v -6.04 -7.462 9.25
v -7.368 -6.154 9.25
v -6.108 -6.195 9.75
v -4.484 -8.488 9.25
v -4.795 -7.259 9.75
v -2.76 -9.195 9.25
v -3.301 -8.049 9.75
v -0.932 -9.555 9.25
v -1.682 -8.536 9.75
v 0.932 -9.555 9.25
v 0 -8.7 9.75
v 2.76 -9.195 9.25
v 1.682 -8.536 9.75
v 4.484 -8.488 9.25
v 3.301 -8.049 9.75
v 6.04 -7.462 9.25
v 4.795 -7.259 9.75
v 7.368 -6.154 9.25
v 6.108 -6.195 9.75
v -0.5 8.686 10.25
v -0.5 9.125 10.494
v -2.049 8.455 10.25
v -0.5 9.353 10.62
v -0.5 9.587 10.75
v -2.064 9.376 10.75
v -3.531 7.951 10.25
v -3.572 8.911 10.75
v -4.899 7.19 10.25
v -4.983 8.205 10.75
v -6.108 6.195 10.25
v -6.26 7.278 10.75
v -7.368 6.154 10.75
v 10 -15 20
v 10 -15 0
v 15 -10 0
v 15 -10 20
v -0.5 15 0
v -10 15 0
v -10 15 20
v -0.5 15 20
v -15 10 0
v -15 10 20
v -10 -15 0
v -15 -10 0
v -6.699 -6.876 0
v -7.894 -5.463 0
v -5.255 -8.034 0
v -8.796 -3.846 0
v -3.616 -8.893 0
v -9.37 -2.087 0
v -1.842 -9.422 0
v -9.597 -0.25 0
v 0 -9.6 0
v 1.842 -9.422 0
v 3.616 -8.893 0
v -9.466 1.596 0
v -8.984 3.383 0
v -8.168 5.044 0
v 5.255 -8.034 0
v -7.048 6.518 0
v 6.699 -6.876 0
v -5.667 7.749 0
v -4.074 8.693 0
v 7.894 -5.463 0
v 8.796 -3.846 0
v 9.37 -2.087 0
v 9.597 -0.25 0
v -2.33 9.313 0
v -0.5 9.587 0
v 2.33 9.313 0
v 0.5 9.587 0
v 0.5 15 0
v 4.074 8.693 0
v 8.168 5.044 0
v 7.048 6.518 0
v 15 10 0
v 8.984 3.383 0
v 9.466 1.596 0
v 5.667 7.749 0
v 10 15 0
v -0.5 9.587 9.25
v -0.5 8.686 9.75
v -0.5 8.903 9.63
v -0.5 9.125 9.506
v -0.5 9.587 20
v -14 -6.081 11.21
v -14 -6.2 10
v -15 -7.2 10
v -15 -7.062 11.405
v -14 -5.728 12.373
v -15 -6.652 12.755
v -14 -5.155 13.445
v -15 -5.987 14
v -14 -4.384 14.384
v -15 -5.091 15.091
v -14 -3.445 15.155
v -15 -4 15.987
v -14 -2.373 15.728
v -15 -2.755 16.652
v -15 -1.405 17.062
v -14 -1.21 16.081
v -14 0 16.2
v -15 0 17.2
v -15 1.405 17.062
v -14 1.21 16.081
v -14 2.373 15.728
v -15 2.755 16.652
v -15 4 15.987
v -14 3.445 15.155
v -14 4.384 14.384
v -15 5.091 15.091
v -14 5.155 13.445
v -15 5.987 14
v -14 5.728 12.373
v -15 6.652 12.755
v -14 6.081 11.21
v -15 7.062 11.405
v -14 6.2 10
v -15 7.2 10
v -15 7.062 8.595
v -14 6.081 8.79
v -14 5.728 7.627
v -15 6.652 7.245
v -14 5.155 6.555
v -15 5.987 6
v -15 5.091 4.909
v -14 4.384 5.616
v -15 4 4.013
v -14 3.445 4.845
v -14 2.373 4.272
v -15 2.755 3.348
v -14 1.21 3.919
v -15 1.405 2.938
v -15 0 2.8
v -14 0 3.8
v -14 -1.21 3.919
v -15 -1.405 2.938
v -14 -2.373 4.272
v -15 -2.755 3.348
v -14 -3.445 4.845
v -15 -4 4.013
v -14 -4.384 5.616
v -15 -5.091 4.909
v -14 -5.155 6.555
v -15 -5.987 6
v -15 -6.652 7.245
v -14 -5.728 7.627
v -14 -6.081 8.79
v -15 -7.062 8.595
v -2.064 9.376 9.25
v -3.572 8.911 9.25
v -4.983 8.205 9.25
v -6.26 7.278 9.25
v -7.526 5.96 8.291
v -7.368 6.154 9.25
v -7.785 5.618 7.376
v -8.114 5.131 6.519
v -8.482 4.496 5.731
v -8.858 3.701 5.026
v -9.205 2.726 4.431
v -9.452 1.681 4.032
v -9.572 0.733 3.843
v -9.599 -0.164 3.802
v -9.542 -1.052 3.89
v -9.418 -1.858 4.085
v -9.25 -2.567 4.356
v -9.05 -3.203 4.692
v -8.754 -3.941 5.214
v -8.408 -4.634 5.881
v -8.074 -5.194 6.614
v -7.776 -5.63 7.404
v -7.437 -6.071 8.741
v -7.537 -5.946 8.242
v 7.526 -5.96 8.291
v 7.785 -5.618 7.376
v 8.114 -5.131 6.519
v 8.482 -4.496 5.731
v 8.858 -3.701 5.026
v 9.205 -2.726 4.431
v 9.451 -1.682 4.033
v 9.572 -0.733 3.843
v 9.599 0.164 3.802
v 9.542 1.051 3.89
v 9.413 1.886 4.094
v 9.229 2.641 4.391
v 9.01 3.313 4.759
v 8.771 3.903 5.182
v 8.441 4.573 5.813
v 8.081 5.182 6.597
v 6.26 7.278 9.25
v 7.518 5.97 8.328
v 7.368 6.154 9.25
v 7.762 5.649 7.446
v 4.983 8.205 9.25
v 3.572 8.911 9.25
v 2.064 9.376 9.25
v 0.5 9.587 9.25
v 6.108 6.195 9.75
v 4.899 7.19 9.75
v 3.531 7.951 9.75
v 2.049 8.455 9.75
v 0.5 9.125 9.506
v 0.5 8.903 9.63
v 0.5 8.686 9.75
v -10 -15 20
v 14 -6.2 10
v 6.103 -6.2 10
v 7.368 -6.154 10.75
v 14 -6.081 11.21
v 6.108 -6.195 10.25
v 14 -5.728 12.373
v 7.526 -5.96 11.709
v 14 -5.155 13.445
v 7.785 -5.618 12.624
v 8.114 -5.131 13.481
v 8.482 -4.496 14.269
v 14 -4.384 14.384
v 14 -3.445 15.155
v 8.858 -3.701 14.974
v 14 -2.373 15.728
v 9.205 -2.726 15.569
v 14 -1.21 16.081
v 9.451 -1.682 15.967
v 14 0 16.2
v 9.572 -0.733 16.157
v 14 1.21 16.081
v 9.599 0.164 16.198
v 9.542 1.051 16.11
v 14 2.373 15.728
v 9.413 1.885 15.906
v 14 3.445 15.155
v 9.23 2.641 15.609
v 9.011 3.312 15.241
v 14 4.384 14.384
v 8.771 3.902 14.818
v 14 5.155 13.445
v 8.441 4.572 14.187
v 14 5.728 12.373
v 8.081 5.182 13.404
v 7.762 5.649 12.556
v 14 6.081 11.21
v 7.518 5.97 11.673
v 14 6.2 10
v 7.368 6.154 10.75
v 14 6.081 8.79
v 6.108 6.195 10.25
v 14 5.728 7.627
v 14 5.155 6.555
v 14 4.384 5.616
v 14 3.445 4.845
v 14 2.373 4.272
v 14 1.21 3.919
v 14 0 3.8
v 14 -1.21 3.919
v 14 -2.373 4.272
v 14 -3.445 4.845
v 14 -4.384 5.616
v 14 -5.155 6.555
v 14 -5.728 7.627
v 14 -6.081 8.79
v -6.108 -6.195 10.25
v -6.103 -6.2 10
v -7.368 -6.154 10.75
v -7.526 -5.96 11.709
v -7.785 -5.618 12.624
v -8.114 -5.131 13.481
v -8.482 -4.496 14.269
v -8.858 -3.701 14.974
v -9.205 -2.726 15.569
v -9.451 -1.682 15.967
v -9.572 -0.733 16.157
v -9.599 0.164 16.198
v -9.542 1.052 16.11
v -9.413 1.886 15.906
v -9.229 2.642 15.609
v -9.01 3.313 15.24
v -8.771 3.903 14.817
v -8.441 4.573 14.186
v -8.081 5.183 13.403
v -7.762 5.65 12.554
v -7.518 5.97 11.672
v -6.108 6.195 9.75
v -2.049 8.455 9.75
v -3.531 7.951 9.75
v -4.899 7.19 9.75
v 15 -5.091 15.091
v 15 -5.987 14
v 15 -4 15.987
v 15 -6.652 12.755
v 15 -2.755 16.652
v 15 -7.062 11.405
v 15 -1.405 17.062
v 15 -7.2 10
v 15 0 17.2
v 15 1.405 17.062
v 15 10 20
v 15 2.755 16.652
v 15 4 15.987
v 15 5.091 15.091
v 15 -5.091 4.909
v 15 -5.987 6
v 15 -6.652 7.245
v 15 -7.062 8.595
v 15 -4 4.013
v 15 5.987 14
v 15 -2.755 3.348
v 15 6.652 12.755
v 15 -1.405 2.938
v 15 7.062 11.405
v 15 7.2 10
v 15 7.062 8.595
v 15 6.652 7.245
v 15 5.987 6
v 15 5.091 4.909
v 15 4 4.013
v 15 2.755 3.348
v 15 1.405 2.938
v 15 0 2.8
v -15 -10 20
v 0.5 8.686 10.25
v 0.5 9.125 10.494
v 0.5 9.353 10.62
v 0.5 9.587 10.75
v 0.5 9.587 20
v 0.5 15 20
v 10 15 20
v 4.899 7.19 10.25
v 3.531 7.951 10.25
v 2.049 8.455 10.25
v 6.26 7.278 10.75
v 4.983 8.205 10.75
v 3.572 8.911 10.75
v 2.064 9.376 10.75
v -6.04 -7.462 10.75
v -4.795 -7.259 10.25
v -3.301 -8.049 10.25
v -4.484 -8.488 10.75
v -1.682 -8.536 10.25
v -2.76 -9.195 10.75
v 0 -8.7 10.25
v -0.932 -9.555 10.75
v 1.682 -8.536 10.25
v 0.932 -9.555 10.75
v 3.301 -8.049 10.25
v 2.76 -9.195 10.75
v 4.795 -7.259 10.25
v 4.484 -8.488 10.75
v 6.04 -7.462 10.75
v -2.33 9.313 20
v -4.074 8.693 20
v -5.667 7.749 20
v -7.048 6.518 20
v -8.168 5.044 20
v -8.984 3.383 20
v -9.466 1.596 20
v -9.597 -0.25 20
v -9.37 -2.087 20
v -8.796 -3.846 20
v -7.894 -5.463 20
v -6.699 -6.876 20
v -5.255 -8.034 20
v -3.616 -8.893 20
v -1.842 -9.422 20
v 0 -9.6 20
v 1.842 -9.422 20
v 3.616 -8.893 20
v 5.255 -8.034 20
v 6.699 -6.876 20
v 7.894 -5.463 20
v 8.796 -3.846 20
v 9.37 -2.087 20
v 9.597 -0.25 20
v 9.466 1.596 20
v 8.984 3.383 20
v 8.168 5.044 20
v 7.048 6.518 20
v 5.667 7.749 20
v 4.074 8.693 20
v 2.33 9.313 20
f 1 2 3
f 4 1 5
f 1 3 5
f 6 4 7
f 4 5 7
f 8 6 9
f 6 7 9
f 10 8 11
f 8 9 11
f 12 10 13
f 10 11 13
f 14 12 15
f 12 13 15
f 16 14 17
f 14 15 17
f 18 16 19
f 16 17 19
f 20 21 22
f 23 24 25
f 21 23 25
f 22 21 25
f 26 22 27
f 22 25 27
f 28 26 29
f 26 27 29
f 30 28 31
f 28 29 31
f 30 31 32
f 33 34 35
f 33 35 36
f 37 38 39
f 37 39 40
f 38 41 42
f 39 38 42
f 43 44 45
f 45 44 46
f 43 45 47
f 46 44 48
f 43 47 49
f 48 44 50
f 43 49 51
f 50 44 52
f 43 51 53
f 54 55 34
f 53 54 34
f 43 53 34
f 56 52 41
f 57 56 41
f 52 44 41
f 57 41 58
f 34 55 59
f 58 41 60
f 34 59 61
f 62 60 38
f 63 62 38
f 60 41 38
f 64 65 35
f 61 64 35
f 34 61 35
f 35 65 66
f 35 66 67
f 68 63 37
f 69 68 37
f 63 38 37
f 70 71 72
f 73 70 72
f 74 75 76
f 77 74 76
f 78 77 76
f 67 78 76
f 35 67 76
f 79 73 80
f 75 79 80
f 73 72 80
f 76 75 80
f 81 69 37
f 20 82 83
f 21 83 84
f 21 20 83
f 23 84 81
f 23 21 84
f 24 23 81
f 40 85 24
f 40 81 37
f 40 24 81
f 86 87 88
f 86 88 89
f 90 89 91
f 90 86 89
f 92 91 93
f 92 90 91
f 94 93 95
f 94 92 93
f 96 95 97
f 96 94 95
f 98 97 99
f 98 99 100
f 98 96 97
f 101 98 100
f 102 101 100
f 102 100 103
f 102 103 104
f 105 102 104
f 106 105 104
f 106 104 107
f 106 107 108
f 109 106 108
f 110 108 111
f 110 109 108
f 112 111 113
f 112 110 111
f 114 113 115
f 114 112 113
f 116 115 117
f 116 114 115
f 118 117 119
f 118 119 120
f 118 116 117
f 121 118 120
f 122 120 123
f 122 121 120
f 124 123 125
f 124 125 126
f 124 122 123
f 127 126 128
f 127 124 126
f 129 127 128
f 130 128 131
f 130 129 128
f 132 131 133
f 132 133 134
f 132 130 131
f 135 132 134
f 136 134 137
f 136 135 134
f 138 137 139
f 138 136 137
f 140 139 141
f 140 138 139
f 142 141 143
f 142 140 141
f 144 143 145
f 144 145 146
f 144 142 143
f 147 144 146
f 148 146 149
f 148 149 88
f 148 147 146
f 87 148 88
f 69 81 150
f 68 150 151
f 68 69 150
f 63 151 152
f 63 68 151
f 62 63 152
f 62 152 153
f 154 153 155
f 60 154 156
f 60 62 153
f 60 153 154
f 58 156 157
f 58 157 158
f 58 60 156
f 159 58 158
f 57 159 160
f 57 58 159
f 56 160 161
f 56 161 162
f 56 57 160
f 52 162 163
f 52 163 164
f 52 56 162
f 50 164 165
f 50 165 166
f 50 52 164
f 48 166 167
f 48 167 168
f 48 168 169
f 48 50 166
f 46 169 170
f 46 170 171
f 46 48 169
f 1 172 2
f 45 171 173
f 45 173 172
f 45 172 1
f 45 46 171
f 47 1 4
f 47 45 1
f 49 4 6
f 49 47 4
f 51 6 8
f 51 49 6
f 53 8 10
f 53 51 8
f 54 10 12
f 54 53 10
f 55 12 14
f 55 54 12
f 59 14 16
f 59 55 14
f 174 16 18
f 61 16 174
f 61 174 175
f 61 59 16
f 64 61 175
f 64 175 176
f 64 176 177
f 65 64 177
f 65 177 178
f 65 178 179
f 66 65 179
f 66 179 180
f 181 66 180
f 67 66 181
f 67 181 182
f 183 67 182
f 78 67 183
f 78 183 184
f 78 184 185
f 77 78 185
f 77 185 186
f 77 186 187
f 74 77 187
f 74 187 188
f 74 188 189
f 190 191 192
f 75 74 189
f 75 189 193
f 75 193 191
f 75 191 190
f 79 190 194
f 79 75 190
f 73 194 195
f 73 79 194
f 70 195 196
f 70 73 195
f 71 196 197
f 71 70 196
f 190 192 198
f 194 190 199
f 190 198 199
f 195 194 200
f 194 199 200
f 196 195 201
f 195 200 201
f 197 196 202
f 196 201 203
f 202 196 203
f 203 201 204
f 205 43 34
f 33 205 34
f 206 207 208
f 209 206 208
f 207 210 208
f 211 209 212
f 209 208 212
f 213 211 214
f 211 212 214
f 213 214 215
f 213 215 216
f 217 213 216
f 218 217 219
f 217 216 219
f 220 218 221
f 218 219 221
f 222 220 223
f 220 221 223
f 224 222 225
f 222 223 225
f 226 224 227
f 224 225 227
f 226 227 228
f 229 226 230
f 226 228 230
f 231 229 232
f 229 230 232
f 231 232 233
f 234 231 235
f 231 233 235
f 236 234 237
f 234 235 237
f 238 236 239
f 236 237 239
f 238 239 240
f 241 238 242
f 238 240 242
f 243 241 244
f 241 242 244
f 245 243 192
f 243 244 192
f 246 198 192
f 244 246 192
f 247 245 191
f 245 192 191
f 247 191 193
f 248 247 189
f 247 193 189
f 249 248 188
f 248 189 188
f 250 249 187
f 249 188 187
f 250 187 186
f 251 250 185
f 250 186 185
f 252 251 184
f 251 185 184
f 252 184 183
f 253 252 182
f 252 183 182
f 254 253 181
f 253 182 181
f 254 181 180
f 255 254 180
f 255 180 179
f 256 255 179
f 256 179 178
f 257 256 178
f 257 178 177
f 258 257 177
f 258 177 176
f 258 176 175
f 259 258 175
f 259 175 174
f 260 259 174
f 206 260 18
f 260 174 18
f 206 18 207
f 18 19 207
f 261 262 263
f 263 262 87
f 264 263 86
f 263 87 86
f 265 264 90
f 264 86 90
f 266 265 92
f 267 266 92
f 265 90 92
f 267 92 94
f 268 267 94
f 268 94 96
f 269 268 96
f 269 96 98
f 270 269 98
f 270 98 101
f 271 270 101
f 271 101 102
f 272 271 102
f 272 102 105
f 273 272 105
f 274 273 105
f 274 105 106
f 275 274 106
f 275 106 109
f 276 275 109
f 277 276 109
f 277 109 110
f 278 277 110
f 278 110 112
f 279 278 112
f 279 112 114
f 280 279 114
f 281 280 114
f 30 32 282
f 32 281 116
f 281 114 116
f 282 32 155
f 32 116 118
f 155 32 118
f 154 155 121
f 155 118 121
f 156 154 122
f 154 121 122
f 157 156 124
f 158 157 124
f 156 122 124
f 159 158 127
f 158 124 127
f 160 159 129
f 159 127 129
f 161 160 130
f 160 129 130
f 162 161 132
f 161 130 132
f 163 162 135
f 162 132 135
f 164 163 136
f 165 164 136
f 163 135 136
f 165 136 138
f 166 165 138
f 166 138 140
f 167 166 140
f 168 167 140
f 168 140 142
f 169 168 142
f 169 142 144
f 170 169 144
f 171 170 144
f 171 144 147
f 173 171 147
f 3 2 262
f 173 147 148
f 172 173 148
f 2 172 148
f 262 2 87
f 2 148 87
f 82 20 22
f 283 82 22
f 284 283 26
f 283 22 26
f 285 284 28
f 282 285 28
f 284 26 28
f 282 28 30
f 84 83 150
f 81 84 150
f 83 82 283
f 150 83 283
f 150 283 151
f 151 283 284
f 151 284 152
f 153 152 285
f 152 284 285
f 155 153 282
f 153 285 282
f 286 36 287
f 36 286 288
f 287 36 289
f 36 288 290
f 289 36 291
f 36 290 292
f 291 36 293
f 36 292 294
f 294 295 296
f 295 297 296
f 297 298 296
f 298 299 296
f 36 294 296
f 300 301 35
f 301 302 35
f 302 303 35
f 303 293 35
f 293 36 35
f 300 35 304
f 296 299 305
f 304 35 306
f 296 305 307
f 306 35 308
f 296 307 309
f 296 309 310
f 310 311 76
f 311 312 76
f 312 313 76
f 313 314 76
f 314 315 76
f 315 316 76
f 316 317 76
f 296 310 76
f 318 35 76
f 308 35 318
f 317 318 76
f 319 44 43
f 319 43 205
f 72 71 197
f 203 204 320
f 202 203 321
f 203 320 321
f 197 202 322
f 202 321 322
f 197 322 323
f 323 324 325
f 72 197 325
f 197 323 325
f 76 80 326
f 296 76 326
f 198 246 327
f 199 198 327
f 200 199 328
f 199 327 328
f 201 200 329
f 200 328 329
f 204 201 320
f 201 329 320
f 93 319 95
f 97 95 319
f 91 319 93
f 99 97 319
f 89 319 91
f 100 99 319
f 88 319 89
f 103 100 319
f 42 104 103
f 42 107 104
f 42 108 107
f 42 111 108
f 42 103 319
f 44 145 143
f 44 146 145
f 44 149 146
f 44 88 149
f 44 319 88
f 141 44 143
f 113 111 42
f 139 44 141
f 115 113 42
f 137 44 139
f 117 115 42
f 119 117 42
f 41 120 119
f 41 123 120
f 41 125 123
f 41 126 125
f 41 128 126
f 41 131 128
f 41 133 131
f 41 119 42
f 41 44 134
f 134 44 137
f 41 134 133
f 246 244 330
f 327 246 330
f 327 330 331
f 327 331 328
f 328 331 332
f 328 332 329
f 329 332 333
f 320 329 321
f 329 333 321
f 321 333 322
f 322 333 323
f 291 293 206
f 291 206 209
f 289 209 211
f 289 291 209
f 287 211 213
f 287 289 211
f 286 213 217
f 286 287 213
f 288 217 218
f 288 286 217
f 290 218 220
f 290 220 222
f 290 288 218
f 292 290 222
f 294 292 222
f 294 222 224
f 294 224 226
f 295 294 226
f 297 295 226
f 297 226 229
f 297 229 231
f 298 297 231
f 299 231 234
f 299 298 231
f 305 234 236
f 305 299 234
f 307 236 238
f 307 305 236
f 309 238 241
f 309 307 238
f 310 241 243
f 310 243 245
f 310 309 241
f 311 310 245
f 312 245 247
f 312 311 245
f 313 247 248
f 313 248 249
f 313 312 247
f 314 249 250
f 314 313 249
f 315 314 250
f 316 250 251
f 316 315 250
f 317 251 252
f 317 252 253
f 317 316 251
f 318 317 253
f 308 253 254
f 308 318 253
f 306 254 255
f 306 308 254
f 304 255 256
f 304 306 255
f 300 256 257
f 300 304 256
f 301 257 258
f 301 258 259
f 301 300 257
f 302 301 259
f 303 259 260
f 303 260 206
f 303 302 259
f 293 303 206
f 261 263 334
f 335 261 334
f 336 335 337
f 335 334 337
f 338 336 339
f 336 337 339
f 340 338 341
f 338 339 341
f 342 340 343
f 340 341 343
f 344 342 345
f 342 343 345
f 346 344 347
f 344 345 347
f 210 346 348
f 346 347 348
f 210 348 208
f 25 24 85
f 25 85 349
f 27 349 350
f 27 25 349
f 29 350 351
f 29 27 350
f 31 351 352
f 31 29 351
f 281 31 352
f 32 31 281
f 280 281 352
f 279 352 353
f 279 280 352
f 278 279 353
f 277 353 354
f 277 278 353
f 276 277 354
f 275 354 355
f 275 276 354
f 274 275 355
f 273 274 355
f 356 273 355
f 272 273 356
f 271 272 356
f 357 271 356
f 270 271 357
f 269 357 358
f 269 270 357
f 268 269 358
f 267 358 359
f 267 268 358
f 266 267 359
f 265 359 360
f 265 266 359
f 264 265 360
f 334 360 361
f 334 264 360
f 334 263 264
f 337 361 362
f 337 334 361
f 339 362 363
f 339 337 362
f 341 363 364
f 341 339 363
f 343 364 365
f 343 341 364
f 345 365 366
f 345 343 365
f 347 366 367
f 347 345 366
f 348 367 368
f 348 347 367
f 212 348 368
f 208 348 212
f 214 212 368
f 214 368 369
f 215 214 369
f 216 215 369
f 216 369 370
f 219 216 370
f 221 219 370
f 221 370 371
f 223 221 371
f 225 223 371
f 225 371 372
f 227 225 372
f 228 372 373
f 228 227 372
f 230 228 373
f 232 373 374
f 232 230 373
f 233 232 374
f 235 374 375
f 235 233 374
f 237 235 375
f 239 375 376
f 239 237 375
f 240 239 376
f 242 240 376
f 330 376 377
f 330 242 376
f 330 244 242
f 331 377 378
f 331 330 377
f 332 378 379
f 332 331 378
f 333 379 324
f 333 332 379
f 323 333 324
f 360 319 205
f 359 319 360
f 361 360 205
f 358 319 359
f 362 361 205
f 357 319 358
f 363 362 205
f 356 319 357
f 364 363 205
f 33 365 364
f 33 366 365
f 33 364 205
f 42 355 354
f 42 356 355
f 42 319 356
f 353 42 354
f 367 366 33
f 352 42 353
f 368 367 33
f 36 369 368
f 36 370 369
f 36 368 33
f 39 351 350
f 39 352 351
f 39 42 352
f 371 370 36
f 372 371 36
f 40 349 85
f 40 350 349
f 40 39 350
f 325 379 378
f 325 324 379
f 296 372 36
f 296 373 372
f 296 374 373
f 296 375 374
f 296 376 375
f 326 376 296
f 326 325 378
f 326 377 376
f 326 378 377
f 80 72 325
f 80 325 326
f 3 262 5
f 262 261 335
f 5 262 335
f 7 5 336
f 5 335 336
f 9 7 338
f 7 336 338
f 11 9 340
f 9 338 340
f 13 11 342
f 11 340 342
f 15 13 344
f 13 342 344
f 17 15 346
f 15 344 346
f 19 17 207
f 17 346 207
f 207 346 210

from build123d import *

# Parameters (mm, degrees)
SKETCH047_W     = 30
SKETCH047_H     = 30
SKETCH047_R     = 9.6
PAD018_DEPTH    = 20
SKETCH049_W     = 1
SKETCH049_H     = 15
POCKET028_DEPTH = 20
SKETCH050_R     = 6.2
POCKET029_DEPTH = 40
CHAMFER004_SIZE = 1
CHAMFER005_SIZE = 5


with BuildPart() as part:
    # Sketch047 → Pad018 (new body)
    with BuildSketch(Plane.XY):
        Rectangle(SKETCH047_W, SKETCH047_H)
        Circle(SKETCH047_R, mode=Mode.SUBTRACT)
    extrude(amount=PAD018_DEPTH)

    # Sketch048 → Revolution002 (revolve)
    with BuildSketch(Plane.YZ):
        Polygon((9.6, 10.75), (9.6, 9.25), (8.7, 9.75), (8.7, 10.25), align=None)
    revolve(axis=Axis((0, 0, 0), (0, 0, 1)))

    # Sketch049 (on Face11 of Revolution002) → Pocket028 (cut)
    with BuildSketch(Plane.XY.offset(20)):
        with Locations((0, 7.5)):
            Rectangle(SKETCH049_W, SKETCH049_H)
    extrude(amount=-POCKET028_DEPTH, mode=Mode.SUBTRACT)

    # Sketch050 (on Face12 of Pocket028) → Pocket029 (cut)
    with BuildSketch(Plane(origin=(-15, 0, 0), x_dir=(0, -1, 0), z_dir=(-1, 0, 0))):
        with Locations((0, 10)):
            Circle(SKETCH050_R)
    extrude(amount=-POCKET029_DEPTH, mode=Mode.SUBTRACT)

    # Chamfer004
    chamfer004_edges = [part.edges().sort_by_distance(p)[0] for p in [
        (-15, 6.2, 10),
        (15, 6.2, 10),
    ]]
    chamfer(chamfer004_edges, length=CHAMFER004_SIZE)

    # Chamfer005
    chamfer005_edges = [part.edges().sort_by_distance(p)[0] for p in [
        (-15, -15, 10),
        (-15, 15, 10),
        (15, -15, 10),
        (15, 15, 10),
    ]]
    chamfer(chamfer005_edges, length=CHAMFER005_SIZE)


solid = part.part
